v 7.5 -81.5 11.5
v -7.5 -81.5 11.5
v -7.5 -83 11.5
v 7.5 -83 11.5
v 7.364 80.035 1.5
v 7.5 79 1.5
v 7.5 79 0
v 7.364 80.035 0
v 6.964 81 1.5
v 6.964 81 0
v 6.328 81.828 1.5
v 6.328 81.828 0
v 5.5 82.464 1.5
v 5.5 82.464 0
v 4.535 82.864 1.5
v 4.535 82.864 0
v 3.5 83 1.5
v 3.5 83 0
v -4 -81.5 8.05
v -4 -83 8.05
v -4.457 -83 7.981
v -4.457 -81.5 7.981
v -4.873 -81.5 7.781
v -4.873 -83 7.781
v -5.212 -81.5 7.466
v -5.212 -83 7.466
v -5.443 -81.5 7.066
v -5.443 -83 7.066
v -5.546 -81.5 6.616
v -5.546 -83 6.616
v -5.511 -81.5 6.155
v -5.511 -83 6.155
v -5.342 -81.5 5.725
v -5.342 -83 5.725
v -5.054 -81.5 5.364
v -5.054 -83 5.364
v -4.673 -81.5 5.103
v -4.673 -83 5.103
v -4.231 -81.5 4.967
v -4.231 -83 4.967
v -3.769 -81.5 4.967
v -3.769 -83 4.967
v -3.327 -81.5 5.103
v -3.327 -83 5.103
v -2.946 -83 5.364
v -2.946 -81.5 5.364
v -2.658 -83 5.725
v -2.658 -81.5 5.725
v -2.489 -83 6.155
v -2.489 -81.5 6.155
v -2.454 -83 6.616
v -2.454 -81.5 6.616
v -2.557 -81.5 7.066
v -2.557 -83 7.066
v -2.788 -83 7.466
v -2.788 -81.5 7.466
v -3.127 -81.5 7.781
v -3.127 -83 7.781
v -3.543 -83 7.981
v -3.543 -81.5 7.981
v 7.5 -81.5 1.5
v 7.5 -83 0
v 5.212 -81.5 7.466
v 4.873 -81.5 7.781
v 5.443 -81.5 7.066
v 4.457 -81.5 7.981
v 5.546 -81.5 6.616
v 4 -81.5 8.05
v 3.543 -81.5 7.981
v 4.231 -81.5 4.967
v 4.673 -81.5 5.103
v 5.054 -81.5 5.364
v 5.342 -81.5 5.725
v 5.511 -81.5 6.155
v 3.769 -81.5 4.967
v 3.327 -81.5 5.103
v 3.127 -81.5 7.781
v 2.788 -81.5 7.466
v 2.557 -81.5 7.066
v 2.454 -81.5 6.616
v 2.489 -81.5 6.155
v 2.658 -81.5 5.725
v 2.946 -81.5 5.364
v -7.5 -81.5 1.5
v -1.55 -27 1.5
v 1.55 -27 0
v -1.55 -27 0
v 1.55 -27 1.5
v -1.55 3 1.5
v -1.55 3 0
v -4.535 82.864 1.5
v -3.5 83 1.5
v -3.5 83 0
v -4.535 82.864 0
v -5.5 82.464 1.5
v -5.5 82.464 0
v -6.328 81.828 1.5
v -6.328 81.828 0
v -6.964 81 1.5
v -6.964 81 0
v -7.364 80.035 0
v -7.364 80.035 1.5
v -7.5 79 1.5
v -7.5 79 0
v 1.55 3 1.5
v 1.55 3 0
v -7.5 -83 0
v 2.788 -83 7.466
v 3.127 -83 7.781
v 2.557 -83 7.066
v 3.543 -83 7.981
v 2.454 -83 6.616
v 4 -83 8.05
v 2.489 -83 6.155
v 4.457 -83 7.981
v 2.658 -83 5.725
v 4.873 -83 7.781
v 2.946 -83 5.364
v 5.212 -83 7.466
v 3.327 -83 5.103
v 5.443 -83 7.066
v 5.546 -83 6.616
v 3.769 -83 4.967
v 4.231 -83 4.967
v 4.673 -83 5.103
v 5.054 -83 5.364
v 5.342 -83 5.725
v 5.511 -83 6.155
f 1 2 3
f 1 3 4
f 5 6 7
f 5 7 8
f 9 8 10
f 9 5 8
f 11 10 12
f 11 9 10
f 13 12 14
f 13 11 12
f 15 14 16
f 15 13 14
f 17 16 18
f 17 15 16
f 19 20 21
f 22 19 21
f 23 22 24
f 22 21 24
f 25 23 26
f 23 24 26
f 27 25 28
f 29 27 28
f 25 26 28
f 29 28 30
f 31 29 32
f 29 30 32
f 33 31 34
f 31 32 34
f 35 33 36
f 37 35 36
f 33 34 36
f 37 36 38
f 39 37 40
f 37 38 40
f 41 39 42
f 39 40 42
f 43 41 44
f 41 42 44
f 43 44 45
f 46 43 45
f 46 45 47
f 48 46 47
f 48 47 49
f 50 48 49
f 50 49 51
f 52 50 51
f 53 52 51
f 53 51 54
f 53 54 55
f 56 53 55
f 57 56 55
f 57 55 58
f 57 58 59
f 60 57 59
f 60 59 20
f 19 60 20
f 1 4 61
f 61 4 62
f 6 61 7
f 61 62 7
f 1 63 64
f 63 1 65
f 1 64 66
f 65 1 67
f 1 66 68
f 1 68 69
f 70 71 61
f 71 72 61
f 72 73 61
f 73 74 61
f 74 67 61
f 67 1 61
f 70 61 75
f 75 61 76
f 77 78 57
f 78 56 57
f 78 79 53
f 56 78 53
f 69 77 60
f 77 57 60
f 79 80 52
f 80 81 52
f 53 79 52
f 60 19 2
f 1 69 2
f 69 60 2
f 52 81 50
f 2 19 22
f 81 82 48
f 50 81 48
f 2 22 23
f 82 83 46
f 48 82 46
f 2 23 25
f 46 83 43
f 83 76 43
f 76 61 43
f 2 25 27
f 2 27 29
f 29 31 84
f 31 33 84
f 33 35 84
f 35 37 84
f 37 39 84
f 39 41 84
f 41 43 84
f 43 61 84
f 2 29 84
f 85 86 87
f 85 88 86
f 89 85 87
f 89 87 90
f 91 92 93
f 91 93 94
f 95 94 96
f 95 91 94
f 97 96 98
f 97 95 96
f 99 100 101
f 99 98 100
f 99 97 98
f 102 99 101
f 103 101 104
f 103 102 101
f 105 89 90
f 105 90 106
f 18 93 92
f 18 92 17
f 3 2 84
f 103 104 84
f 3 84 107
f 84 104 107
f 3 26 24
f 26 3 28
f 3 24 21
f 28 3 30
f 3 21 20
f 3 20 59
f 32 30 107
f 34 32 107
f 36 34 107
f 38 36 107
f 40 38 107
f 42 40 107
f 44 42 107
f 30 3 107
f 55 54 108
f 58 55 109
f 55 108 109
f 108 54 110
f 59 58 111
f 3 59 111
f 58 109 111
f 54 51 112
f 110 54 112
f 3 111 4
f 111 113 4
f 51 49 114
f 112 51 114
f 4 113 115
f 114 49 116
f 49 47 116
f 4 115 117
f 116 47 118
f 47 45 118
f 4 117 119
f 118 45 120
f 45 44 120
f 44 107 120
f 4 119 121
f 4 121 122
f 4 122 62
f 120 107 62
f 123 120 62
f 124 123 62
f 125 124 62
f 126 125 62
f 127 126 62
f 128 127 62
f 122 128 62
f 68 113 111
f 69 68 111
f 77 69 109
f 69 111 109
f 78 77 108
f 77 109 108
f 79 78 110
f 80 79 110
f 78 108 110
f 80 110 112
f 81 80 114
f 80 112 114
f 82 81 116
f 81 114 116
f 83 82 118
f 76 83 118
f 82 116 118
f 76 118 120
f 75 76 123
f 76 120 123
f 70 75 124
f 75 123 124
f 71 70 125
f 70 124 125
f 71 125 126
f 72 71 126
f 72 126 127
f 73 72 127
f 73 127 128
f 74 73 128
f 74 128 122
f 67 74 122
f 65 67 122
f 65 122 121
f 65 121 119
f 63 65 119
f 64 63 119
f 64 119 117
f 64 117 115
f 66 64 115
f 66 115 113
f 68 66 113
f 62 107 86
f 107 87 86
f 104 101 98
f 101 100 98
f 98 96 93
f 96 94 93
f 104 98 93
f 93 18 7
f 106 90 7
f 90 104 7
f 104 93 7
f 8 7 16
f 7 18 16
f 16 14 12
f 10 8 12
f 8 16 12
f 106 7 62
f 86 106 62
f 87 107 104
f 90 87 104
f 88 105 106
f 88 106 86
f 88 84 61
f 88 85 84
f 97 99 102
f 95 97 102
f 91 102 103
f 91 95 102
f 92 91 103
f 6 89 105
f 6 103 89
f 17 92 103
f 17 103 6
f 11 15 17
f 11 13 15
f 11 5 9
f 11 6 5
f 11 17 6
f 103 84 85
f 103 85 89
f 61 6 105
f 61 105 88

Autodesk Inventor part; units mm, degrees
ref_plane "YZ Plane" through (0, 0, 0) normal (1, 0, 0) x (0, 1, 0)
ref_plane "XZ Plane" through (0, 0, 0) normal (0, 1, 0) x (-1, 0, 0)
ref_plane "XY Plane" through (0, 0, 0) normal (0, 0, 1) x (1, 0, 0)
sketch "スケッチ1" plane through (0, 0, 0) normal (0, 0, 1) x (1, 0, 0)
  line L0 (-7.5, 83) -> (7.5, 83)
  line L1 (7.5, 83) -> (7.5, -83)
  line L2 (7.5, -83) -> (-7.5, -83)
  line L3 (-7.5, -83) -> (-7.5, 83)
  line L4 (-7.5, 83) -> (7.5, -83) construction
  line L5 (7.5, 83) -> (-7.5, -83) construction
  point P0 (0, 0)
  dimension "d0" = 15
  dimension "d1" = 166
extrude "押し出し1" add sketch "スケッチ1" along normal blind 1.5
sketch "スケッチ2" plane through (0, 0, 1.5) normal (0, 0, 1) x (1, 0, 0)
  line L0 (7.5, 83) -> (-7.5, 83) projected
  line L1 (-1.55, 3) -> (1.55, 3)
  line L2 (1.55, 3) -> (1.55, -27)
  line L3 (1.55, -27) -> (-1.55, -27)
  line L4 (-1.55, -27) -> (-1.55, 3)
  line L5 (-7.5, 83) -> (-7.5, -83) projected
  point P0 (0, 0)
  dimension "d6" = 3.1
  dimension "d7" = 30
  dimension "d8" = 80
  dimension "d9" = 5.95
extrude "押し出し2" cut sketch "スケッチ2" against normal blind 1.5
sketch "スケッチ3" plane through (0, 0, 1.5) normal (0, 0, 1) x (1, 0, 0)
  line L0 (-7.5, -83) -> (7.5, -83)
  line L1 (7.5, -83) -> (7.5, -81.5)
  line L2 (7.5, -81.5) -> (-7.5, -81.5)
  line L3 (-7.5, -81.5) -> (-7.5, -83)
  point P0 (0, 0)
  dimension "d12" = 1.5
extrude "押し出し3" add sketch "スケッチ3" along normal blind 10
sketch "スケッチ4" plane through (-7.5, -81.5, 1.5) normal (0, 1, 0) x (1, 0, 0)
  line L0 (15, -10) -> (0, -10) projected
  line L1 (15, 0) -> (15, -10) projected
  point P0 (7.5, 1.5)
  point P1 (11.5, -5)
  point P2 (3.5, -5)
  dimension "d15" = 8
  dimension "d16" = 5
  dimension "d17" = 3.5
hole "穴1" at (4, -81.5, 6.5) at (-4, -81.5, 6.5) direction (0, -1, 0) diameter 3.1 end through all
fillet "フィレット1" radius 4 2 edges at (-7.5, 83, 0.75) (7.5, 83, 0.75)
properties part number "pre1" material "アルミニウム 5052 H32"
